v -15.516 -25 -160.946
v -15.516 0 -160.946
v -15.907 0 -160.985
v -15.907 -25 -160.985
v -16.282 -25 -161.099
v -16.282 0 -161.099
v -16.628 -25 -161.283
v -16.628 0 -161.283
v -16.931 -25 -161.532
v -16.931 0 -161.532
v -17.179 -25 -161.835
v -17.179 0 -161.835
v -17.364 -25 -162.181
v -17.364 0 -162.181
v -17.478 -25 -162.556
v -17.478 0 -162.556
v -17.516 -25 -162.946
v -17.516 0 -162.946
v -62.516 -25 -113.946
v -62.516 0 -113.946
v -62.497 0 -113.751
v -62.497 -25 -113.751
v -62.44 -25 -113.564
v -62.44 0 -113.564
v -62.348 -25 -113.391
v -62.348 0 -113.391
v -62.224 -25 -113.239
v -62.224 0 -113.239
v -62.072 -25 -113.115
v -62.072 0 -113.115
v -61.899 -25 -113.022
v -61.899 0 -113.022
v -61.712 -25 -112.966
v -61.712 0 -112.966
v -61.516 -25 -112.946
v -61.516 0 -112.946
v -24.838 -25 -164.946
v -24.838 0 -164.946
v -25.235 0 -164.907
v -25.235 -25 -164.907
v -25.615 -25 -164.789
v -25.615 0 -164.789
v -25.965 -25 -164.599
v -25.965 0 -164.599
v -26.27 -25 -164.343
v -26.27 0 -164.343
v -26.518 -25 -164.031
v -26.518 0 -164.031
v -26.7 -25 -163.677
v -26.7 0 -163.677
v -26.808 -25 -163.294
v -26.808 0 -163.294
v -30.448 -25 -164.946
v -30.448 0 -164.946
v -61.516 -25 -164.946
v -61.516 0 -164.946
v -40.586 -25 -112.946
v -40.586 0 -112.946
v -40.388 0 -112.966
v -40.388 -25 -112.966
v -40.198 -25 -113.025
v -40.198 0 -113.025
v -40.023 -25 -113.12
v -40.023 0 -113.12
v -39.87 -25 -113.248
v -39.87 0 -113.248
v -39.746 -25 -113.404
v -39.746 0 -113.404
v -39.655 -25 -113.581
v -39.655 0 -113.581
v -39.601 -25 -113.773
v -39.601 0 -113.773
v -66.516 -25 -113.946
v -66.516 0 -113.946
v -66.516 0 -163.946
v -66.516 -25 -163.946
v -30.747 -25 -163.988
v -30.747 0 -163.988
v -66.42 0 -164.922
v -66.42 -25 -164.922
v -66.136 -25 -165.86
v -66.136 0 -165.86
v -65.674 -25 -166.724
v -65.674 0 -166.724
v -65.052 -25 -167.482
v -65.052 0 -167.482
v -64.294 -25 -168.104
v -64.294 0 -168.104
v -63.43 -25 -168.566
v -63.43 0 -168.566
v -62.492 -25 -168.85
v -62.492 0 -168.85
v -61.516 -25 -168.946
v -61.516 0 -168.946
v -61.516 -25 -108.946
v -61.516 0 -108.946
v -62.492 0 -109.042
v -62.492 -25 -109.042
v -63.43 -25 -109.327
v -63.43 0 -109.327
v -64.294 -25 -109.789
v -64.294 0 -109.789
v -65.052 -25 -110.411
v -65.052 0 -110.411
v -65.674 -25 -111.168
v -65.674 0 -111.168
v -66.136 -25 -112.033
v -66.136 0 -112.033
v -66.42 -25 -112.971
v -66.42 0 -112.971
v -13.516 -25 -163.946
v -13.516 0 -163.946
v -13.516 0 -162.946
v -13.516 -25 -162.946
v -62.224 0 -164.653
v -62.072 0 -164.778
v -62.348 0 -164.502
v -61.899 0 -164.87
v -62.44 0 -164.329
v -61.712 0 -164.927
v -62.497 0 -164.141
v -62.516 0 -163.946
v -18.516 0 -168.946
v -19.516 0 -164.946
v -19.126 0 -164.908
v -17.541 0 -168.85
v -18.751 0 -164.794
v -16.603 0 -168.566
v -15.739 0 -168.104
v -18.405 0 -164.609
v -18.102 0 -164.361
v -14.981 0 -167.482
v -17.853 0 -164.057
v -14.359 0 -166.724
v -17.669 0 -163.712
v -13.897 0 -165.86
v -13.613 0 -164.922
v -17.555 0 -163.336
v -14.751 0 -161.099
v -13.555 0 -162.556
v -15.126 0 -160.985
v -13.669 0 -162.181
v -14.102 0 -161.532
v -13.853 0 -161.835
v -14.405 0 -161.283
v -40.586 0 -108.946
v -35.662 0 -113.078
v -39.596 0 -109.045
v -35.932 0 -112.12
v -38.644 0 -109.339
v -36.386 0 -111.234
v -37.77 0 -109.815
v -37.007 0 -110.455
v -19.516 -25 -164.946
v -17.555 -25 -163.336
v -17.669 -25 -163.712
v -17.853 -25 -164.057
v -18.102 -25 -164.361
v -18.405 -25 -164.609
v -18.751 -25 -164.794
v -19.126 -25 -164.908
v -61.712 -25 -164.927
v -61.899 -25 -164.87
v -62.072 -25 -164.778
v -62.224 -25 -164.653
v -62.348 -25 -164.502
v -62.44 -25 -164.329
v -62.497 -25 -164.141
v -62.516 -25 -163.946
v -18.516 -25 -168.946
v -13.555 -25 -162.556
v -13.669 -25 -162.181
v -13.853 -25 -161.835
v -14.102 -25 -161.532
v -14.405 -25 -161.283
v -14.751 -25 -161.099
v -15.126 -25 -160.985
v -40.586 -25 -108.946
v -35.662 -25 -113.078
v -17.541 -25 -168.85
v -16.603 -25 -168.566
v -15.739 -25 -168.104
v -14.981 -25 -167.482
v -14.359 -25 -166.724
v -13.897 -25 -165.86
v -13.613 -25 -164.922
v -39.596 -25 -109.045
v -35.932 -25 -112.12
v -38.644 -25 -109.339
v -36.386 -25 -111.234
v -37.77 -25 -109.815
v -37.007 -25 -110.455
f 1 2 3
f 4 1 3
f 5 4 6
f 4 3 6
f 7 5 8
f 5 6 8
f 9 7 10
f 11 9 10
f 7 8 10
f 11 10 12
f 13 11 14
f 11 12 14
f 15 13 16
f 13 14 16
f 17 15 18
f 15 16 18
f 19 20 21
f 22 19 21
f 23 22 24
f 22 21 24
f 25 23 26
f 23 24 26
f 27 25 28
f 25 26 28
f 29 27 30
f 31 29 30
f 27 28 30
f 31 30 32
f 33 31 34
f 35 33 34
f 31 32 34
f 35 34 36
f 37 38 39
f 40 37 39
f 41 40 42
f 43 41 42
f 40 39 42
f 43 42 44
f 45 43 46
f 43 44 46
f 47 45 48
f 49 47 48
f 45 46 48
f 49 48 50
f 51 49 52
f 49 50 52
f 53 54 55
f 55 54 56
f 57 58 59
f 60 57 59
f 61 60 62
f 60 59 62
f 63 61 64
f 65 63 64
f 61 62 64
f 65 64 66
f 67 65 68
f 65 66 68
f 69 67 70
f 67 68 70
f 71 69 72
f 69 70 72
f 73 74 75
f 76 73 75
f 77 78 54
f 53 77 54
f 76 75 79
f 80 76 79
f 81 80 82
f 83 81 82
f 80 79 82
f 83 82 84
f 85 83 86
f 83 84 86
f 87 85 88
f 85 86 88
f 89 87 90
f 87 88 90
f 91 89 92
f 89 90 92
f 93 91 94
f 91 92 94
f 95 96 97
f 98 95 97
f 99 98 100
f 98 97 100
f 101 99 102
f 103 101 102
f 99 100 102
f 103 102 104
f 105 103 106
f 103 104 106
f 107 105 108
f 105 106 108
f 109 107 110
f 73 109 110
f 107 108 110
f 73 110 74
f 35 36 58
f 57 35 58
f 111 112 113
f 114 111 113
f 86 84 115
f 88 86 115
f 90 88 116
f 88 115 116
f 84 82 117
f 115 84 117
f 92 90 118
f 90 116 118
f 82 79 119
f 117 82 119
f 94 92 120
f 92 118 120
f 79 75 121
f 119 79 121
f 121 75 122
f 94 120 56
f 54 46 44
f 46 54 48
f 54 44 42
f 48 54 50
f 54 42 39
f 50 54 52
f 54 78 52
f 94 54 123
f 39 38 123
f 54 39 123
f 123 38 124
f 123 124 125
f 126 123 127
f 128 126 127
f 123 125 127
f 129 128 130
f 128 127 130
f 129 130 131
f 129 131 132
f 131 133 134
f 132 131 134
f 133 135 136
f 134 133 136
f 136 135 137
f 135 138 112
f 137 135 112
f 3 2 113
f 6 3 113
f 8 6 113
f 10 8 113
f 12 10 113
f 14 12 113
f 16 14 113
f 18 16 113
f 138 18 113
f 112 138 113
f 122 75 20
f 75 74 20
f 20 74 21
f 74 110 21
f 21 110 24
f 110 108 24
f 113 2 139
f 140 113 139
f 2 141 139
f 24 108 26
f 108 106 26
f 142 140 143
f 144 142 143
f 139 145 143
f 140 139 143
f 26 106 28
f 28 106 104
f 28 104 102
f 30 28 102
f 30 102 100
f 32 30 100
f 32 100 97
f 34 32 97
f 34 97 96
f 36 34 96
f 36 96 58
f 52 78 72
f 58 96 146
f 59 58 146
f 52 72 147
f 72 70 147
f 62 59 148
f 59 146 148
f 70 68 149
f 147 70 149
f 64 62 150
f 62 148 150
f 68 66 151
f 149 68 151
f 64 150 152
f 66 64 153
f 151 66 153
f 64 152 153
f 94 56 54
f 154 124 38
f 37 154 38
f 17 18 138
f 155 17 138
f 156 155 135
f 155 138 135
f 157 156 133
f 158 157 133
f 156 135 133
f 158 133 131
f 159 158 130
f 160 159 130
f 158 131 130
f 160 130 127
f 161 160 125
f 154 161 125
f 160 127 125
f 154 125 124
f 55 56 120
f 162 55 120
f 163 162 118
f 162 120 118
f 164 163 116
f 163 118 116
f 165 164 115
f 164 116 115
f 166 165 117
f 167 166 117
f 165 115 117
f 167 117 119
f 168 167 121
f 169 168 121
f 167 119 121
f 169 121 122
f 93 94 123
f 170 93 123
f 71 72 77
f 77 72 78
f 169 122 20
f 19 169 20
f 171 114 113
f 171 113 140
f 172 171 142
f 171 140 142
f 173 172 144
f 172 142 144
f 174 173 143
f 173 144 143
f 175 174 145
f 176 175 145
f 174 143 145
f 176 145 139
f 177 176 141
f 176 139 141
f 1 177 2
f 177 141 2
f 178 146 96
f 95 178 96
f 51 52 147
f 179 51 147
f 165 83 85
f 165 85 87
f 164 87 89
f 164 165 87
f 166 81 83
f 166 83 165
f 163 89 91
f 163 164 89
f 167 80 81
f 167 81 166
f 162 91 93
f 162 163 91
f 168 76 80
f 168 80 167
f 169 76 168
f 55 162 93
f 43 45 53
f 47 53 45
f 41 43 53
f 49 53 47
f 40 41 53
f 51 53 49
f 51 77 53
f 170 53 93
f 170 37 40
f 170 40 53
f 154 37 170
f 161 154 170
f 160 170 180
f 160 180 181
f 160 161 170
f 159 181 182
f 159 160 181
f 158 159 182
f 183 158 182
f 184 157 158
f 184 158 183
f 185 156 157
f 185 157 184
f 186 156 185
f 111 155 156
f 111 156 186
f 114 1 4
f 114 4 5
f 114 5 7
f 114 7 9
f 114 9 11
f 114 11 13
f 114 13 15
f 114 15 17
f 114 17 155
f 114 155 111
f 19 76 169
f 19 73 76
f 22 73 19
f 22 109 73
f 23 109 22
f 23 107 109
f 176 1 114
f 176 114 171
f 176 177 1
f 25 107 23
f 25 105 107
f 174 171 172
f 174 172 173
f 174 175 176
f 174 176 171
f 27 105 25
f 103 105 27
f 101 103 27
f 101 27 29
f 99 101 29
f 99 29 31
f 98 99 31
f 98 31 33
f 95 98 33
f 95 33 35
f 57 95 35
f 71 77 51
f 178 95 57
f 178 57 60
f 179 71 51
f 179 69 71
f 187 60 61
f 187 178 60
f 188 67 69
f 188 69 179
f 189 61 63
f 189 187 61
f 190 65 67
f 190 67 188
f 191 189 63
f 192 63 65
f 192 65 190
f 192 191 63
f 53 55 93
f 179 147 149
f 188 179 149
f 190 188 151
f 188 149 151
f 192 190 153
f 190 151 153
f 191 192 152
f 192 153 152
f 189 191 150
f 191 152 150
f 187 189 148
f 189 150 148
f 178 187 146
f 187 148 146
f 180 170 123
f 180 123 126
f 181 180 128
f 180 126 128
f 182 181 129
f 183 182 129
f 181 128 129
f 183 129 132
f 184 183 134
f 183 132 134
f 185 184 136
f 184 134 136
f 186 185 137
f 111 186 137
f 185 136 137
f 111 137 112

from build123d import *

# Parameters (mm, degrees)
F1_DEPTH = 25


with BuildPart() as f1:
    # F0 (on Front) → F1 (new body)
    with BuildSketch(Plane.XZ):
        with BuildLine():
            ThreePointArc((-66.516432, -163.946287), (-65.051966, -167.481821), (-61.516432, -168.946287))
            Line((-61.516432, -168.946287), (-18.516432, -168.946287))
            ThreePointArc((-18.516432, -168.946287), (-14.980898, -167.481821), (-13.516432, -163.946287))
            Line((-13.516432, -163.946287), (-13.516432, -162.946287))
            ThreePointArc((-13.516432, -162.946287), (-14.102218, -161.532073), (-15.516432, -160.946287))
            ThreePointArc((-15.516432, -160.946287), (-16.930645, -161.532073), (-17.516432, -162.946287))
            ThreePointArc((-17.516432, -162.946287), (-18.102218, -164.3605), (-19.516432, -164.946287))
            Line((-19.516432, -164.946287), (-24.838233, -164.946287))
            ThreePointArc((-24.838233, -164.946287), (-26.123808, -164.478376), (-26.807848, -163.293583))
            Line((-26.807848, -163.293583), (-35.662202, -113.078046))
            ThreePointArc((-35.662202, -113.078046), (-37.372303, -110.116065), (-40.586241, -108.946287))
            Line((-40.586241, -108.946287), (-61.516432, -108.946287))
            ThreePointArc((-61.516432, -108.946287), (-65.051966, -110.410753), (-66.516432, -113.946287))
            Line((-66.516432, -113.946287), (-66.516432, -163.946287))
        make_face()
        with BuildLine():
            Line((-39.601433, -113.772639), (-30.747079, -163.988176))
            Line((-30.747079, -163.988176), (-30.448126, -164.946287))
            Line((-30.448126, -164.946287), (-61.516432, -164.946287))
            ThreePointArc((-61.516432, -164.946287), (-62.223539, -164.653394), (-62.516432, -163.946287))
            Line((-62.516432, -163.946287), (-62.516432, -113.946287))
            ThreePointArc((-62.516432, -113.946287), (-62.223539, -113.23918), (-61.516432, -112.946287))
            Line((-61.516432, -112.946287), (-40.586241, -112.946287))
            ThreePointArc((-40.586241, -112.946287), (-39.943453, -113.180242), (-39.601433, -113.772639))
        make_face(mode=Mode.SUBTRACT)
    extrude(amount=F1_DEPTH)


solid = f1.part
